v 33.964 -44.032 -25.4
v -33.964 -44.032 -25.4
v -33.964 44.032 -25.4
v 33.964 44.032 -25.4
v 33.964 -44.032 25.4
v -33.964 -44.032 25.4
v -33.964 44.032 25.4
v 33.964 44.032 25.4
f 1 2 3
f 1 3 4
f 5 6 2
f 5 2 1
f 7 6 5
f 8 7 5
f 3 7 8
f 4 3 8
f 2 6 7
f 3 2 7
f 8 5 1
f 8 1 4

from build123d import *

# Parameters (mm, degrees)
F0_W     = 67.9279565811
F0_H     = 88.0647003651
F1_DEPTH = 25.4
F2_DEPTH = 25.4
F3_DEPTH = 25.4


with BuildPart() as f1:
    # F0 (on Top) → F1 (new body)
    with BuildSketch(Plane.XY):
        Rectangle(F0_W, F0_H)
    extrude(amount=F1_DEPTH)

    # F2 (add): a face of the model
    f2_faces = [f1.faces().sort_by_distance(p)[0] for p in [
        (0, 0, 0),
    ]]
    extrude(f2_faces, amount=F2_DEPTH)

    # F0 (on Top) → F3 (join)
    with BuildSketch(Plane.XY):
        Rectangle(F0_W, F0_H)
    extrude(amount=F3_DEPTH)


solid = f1.part
